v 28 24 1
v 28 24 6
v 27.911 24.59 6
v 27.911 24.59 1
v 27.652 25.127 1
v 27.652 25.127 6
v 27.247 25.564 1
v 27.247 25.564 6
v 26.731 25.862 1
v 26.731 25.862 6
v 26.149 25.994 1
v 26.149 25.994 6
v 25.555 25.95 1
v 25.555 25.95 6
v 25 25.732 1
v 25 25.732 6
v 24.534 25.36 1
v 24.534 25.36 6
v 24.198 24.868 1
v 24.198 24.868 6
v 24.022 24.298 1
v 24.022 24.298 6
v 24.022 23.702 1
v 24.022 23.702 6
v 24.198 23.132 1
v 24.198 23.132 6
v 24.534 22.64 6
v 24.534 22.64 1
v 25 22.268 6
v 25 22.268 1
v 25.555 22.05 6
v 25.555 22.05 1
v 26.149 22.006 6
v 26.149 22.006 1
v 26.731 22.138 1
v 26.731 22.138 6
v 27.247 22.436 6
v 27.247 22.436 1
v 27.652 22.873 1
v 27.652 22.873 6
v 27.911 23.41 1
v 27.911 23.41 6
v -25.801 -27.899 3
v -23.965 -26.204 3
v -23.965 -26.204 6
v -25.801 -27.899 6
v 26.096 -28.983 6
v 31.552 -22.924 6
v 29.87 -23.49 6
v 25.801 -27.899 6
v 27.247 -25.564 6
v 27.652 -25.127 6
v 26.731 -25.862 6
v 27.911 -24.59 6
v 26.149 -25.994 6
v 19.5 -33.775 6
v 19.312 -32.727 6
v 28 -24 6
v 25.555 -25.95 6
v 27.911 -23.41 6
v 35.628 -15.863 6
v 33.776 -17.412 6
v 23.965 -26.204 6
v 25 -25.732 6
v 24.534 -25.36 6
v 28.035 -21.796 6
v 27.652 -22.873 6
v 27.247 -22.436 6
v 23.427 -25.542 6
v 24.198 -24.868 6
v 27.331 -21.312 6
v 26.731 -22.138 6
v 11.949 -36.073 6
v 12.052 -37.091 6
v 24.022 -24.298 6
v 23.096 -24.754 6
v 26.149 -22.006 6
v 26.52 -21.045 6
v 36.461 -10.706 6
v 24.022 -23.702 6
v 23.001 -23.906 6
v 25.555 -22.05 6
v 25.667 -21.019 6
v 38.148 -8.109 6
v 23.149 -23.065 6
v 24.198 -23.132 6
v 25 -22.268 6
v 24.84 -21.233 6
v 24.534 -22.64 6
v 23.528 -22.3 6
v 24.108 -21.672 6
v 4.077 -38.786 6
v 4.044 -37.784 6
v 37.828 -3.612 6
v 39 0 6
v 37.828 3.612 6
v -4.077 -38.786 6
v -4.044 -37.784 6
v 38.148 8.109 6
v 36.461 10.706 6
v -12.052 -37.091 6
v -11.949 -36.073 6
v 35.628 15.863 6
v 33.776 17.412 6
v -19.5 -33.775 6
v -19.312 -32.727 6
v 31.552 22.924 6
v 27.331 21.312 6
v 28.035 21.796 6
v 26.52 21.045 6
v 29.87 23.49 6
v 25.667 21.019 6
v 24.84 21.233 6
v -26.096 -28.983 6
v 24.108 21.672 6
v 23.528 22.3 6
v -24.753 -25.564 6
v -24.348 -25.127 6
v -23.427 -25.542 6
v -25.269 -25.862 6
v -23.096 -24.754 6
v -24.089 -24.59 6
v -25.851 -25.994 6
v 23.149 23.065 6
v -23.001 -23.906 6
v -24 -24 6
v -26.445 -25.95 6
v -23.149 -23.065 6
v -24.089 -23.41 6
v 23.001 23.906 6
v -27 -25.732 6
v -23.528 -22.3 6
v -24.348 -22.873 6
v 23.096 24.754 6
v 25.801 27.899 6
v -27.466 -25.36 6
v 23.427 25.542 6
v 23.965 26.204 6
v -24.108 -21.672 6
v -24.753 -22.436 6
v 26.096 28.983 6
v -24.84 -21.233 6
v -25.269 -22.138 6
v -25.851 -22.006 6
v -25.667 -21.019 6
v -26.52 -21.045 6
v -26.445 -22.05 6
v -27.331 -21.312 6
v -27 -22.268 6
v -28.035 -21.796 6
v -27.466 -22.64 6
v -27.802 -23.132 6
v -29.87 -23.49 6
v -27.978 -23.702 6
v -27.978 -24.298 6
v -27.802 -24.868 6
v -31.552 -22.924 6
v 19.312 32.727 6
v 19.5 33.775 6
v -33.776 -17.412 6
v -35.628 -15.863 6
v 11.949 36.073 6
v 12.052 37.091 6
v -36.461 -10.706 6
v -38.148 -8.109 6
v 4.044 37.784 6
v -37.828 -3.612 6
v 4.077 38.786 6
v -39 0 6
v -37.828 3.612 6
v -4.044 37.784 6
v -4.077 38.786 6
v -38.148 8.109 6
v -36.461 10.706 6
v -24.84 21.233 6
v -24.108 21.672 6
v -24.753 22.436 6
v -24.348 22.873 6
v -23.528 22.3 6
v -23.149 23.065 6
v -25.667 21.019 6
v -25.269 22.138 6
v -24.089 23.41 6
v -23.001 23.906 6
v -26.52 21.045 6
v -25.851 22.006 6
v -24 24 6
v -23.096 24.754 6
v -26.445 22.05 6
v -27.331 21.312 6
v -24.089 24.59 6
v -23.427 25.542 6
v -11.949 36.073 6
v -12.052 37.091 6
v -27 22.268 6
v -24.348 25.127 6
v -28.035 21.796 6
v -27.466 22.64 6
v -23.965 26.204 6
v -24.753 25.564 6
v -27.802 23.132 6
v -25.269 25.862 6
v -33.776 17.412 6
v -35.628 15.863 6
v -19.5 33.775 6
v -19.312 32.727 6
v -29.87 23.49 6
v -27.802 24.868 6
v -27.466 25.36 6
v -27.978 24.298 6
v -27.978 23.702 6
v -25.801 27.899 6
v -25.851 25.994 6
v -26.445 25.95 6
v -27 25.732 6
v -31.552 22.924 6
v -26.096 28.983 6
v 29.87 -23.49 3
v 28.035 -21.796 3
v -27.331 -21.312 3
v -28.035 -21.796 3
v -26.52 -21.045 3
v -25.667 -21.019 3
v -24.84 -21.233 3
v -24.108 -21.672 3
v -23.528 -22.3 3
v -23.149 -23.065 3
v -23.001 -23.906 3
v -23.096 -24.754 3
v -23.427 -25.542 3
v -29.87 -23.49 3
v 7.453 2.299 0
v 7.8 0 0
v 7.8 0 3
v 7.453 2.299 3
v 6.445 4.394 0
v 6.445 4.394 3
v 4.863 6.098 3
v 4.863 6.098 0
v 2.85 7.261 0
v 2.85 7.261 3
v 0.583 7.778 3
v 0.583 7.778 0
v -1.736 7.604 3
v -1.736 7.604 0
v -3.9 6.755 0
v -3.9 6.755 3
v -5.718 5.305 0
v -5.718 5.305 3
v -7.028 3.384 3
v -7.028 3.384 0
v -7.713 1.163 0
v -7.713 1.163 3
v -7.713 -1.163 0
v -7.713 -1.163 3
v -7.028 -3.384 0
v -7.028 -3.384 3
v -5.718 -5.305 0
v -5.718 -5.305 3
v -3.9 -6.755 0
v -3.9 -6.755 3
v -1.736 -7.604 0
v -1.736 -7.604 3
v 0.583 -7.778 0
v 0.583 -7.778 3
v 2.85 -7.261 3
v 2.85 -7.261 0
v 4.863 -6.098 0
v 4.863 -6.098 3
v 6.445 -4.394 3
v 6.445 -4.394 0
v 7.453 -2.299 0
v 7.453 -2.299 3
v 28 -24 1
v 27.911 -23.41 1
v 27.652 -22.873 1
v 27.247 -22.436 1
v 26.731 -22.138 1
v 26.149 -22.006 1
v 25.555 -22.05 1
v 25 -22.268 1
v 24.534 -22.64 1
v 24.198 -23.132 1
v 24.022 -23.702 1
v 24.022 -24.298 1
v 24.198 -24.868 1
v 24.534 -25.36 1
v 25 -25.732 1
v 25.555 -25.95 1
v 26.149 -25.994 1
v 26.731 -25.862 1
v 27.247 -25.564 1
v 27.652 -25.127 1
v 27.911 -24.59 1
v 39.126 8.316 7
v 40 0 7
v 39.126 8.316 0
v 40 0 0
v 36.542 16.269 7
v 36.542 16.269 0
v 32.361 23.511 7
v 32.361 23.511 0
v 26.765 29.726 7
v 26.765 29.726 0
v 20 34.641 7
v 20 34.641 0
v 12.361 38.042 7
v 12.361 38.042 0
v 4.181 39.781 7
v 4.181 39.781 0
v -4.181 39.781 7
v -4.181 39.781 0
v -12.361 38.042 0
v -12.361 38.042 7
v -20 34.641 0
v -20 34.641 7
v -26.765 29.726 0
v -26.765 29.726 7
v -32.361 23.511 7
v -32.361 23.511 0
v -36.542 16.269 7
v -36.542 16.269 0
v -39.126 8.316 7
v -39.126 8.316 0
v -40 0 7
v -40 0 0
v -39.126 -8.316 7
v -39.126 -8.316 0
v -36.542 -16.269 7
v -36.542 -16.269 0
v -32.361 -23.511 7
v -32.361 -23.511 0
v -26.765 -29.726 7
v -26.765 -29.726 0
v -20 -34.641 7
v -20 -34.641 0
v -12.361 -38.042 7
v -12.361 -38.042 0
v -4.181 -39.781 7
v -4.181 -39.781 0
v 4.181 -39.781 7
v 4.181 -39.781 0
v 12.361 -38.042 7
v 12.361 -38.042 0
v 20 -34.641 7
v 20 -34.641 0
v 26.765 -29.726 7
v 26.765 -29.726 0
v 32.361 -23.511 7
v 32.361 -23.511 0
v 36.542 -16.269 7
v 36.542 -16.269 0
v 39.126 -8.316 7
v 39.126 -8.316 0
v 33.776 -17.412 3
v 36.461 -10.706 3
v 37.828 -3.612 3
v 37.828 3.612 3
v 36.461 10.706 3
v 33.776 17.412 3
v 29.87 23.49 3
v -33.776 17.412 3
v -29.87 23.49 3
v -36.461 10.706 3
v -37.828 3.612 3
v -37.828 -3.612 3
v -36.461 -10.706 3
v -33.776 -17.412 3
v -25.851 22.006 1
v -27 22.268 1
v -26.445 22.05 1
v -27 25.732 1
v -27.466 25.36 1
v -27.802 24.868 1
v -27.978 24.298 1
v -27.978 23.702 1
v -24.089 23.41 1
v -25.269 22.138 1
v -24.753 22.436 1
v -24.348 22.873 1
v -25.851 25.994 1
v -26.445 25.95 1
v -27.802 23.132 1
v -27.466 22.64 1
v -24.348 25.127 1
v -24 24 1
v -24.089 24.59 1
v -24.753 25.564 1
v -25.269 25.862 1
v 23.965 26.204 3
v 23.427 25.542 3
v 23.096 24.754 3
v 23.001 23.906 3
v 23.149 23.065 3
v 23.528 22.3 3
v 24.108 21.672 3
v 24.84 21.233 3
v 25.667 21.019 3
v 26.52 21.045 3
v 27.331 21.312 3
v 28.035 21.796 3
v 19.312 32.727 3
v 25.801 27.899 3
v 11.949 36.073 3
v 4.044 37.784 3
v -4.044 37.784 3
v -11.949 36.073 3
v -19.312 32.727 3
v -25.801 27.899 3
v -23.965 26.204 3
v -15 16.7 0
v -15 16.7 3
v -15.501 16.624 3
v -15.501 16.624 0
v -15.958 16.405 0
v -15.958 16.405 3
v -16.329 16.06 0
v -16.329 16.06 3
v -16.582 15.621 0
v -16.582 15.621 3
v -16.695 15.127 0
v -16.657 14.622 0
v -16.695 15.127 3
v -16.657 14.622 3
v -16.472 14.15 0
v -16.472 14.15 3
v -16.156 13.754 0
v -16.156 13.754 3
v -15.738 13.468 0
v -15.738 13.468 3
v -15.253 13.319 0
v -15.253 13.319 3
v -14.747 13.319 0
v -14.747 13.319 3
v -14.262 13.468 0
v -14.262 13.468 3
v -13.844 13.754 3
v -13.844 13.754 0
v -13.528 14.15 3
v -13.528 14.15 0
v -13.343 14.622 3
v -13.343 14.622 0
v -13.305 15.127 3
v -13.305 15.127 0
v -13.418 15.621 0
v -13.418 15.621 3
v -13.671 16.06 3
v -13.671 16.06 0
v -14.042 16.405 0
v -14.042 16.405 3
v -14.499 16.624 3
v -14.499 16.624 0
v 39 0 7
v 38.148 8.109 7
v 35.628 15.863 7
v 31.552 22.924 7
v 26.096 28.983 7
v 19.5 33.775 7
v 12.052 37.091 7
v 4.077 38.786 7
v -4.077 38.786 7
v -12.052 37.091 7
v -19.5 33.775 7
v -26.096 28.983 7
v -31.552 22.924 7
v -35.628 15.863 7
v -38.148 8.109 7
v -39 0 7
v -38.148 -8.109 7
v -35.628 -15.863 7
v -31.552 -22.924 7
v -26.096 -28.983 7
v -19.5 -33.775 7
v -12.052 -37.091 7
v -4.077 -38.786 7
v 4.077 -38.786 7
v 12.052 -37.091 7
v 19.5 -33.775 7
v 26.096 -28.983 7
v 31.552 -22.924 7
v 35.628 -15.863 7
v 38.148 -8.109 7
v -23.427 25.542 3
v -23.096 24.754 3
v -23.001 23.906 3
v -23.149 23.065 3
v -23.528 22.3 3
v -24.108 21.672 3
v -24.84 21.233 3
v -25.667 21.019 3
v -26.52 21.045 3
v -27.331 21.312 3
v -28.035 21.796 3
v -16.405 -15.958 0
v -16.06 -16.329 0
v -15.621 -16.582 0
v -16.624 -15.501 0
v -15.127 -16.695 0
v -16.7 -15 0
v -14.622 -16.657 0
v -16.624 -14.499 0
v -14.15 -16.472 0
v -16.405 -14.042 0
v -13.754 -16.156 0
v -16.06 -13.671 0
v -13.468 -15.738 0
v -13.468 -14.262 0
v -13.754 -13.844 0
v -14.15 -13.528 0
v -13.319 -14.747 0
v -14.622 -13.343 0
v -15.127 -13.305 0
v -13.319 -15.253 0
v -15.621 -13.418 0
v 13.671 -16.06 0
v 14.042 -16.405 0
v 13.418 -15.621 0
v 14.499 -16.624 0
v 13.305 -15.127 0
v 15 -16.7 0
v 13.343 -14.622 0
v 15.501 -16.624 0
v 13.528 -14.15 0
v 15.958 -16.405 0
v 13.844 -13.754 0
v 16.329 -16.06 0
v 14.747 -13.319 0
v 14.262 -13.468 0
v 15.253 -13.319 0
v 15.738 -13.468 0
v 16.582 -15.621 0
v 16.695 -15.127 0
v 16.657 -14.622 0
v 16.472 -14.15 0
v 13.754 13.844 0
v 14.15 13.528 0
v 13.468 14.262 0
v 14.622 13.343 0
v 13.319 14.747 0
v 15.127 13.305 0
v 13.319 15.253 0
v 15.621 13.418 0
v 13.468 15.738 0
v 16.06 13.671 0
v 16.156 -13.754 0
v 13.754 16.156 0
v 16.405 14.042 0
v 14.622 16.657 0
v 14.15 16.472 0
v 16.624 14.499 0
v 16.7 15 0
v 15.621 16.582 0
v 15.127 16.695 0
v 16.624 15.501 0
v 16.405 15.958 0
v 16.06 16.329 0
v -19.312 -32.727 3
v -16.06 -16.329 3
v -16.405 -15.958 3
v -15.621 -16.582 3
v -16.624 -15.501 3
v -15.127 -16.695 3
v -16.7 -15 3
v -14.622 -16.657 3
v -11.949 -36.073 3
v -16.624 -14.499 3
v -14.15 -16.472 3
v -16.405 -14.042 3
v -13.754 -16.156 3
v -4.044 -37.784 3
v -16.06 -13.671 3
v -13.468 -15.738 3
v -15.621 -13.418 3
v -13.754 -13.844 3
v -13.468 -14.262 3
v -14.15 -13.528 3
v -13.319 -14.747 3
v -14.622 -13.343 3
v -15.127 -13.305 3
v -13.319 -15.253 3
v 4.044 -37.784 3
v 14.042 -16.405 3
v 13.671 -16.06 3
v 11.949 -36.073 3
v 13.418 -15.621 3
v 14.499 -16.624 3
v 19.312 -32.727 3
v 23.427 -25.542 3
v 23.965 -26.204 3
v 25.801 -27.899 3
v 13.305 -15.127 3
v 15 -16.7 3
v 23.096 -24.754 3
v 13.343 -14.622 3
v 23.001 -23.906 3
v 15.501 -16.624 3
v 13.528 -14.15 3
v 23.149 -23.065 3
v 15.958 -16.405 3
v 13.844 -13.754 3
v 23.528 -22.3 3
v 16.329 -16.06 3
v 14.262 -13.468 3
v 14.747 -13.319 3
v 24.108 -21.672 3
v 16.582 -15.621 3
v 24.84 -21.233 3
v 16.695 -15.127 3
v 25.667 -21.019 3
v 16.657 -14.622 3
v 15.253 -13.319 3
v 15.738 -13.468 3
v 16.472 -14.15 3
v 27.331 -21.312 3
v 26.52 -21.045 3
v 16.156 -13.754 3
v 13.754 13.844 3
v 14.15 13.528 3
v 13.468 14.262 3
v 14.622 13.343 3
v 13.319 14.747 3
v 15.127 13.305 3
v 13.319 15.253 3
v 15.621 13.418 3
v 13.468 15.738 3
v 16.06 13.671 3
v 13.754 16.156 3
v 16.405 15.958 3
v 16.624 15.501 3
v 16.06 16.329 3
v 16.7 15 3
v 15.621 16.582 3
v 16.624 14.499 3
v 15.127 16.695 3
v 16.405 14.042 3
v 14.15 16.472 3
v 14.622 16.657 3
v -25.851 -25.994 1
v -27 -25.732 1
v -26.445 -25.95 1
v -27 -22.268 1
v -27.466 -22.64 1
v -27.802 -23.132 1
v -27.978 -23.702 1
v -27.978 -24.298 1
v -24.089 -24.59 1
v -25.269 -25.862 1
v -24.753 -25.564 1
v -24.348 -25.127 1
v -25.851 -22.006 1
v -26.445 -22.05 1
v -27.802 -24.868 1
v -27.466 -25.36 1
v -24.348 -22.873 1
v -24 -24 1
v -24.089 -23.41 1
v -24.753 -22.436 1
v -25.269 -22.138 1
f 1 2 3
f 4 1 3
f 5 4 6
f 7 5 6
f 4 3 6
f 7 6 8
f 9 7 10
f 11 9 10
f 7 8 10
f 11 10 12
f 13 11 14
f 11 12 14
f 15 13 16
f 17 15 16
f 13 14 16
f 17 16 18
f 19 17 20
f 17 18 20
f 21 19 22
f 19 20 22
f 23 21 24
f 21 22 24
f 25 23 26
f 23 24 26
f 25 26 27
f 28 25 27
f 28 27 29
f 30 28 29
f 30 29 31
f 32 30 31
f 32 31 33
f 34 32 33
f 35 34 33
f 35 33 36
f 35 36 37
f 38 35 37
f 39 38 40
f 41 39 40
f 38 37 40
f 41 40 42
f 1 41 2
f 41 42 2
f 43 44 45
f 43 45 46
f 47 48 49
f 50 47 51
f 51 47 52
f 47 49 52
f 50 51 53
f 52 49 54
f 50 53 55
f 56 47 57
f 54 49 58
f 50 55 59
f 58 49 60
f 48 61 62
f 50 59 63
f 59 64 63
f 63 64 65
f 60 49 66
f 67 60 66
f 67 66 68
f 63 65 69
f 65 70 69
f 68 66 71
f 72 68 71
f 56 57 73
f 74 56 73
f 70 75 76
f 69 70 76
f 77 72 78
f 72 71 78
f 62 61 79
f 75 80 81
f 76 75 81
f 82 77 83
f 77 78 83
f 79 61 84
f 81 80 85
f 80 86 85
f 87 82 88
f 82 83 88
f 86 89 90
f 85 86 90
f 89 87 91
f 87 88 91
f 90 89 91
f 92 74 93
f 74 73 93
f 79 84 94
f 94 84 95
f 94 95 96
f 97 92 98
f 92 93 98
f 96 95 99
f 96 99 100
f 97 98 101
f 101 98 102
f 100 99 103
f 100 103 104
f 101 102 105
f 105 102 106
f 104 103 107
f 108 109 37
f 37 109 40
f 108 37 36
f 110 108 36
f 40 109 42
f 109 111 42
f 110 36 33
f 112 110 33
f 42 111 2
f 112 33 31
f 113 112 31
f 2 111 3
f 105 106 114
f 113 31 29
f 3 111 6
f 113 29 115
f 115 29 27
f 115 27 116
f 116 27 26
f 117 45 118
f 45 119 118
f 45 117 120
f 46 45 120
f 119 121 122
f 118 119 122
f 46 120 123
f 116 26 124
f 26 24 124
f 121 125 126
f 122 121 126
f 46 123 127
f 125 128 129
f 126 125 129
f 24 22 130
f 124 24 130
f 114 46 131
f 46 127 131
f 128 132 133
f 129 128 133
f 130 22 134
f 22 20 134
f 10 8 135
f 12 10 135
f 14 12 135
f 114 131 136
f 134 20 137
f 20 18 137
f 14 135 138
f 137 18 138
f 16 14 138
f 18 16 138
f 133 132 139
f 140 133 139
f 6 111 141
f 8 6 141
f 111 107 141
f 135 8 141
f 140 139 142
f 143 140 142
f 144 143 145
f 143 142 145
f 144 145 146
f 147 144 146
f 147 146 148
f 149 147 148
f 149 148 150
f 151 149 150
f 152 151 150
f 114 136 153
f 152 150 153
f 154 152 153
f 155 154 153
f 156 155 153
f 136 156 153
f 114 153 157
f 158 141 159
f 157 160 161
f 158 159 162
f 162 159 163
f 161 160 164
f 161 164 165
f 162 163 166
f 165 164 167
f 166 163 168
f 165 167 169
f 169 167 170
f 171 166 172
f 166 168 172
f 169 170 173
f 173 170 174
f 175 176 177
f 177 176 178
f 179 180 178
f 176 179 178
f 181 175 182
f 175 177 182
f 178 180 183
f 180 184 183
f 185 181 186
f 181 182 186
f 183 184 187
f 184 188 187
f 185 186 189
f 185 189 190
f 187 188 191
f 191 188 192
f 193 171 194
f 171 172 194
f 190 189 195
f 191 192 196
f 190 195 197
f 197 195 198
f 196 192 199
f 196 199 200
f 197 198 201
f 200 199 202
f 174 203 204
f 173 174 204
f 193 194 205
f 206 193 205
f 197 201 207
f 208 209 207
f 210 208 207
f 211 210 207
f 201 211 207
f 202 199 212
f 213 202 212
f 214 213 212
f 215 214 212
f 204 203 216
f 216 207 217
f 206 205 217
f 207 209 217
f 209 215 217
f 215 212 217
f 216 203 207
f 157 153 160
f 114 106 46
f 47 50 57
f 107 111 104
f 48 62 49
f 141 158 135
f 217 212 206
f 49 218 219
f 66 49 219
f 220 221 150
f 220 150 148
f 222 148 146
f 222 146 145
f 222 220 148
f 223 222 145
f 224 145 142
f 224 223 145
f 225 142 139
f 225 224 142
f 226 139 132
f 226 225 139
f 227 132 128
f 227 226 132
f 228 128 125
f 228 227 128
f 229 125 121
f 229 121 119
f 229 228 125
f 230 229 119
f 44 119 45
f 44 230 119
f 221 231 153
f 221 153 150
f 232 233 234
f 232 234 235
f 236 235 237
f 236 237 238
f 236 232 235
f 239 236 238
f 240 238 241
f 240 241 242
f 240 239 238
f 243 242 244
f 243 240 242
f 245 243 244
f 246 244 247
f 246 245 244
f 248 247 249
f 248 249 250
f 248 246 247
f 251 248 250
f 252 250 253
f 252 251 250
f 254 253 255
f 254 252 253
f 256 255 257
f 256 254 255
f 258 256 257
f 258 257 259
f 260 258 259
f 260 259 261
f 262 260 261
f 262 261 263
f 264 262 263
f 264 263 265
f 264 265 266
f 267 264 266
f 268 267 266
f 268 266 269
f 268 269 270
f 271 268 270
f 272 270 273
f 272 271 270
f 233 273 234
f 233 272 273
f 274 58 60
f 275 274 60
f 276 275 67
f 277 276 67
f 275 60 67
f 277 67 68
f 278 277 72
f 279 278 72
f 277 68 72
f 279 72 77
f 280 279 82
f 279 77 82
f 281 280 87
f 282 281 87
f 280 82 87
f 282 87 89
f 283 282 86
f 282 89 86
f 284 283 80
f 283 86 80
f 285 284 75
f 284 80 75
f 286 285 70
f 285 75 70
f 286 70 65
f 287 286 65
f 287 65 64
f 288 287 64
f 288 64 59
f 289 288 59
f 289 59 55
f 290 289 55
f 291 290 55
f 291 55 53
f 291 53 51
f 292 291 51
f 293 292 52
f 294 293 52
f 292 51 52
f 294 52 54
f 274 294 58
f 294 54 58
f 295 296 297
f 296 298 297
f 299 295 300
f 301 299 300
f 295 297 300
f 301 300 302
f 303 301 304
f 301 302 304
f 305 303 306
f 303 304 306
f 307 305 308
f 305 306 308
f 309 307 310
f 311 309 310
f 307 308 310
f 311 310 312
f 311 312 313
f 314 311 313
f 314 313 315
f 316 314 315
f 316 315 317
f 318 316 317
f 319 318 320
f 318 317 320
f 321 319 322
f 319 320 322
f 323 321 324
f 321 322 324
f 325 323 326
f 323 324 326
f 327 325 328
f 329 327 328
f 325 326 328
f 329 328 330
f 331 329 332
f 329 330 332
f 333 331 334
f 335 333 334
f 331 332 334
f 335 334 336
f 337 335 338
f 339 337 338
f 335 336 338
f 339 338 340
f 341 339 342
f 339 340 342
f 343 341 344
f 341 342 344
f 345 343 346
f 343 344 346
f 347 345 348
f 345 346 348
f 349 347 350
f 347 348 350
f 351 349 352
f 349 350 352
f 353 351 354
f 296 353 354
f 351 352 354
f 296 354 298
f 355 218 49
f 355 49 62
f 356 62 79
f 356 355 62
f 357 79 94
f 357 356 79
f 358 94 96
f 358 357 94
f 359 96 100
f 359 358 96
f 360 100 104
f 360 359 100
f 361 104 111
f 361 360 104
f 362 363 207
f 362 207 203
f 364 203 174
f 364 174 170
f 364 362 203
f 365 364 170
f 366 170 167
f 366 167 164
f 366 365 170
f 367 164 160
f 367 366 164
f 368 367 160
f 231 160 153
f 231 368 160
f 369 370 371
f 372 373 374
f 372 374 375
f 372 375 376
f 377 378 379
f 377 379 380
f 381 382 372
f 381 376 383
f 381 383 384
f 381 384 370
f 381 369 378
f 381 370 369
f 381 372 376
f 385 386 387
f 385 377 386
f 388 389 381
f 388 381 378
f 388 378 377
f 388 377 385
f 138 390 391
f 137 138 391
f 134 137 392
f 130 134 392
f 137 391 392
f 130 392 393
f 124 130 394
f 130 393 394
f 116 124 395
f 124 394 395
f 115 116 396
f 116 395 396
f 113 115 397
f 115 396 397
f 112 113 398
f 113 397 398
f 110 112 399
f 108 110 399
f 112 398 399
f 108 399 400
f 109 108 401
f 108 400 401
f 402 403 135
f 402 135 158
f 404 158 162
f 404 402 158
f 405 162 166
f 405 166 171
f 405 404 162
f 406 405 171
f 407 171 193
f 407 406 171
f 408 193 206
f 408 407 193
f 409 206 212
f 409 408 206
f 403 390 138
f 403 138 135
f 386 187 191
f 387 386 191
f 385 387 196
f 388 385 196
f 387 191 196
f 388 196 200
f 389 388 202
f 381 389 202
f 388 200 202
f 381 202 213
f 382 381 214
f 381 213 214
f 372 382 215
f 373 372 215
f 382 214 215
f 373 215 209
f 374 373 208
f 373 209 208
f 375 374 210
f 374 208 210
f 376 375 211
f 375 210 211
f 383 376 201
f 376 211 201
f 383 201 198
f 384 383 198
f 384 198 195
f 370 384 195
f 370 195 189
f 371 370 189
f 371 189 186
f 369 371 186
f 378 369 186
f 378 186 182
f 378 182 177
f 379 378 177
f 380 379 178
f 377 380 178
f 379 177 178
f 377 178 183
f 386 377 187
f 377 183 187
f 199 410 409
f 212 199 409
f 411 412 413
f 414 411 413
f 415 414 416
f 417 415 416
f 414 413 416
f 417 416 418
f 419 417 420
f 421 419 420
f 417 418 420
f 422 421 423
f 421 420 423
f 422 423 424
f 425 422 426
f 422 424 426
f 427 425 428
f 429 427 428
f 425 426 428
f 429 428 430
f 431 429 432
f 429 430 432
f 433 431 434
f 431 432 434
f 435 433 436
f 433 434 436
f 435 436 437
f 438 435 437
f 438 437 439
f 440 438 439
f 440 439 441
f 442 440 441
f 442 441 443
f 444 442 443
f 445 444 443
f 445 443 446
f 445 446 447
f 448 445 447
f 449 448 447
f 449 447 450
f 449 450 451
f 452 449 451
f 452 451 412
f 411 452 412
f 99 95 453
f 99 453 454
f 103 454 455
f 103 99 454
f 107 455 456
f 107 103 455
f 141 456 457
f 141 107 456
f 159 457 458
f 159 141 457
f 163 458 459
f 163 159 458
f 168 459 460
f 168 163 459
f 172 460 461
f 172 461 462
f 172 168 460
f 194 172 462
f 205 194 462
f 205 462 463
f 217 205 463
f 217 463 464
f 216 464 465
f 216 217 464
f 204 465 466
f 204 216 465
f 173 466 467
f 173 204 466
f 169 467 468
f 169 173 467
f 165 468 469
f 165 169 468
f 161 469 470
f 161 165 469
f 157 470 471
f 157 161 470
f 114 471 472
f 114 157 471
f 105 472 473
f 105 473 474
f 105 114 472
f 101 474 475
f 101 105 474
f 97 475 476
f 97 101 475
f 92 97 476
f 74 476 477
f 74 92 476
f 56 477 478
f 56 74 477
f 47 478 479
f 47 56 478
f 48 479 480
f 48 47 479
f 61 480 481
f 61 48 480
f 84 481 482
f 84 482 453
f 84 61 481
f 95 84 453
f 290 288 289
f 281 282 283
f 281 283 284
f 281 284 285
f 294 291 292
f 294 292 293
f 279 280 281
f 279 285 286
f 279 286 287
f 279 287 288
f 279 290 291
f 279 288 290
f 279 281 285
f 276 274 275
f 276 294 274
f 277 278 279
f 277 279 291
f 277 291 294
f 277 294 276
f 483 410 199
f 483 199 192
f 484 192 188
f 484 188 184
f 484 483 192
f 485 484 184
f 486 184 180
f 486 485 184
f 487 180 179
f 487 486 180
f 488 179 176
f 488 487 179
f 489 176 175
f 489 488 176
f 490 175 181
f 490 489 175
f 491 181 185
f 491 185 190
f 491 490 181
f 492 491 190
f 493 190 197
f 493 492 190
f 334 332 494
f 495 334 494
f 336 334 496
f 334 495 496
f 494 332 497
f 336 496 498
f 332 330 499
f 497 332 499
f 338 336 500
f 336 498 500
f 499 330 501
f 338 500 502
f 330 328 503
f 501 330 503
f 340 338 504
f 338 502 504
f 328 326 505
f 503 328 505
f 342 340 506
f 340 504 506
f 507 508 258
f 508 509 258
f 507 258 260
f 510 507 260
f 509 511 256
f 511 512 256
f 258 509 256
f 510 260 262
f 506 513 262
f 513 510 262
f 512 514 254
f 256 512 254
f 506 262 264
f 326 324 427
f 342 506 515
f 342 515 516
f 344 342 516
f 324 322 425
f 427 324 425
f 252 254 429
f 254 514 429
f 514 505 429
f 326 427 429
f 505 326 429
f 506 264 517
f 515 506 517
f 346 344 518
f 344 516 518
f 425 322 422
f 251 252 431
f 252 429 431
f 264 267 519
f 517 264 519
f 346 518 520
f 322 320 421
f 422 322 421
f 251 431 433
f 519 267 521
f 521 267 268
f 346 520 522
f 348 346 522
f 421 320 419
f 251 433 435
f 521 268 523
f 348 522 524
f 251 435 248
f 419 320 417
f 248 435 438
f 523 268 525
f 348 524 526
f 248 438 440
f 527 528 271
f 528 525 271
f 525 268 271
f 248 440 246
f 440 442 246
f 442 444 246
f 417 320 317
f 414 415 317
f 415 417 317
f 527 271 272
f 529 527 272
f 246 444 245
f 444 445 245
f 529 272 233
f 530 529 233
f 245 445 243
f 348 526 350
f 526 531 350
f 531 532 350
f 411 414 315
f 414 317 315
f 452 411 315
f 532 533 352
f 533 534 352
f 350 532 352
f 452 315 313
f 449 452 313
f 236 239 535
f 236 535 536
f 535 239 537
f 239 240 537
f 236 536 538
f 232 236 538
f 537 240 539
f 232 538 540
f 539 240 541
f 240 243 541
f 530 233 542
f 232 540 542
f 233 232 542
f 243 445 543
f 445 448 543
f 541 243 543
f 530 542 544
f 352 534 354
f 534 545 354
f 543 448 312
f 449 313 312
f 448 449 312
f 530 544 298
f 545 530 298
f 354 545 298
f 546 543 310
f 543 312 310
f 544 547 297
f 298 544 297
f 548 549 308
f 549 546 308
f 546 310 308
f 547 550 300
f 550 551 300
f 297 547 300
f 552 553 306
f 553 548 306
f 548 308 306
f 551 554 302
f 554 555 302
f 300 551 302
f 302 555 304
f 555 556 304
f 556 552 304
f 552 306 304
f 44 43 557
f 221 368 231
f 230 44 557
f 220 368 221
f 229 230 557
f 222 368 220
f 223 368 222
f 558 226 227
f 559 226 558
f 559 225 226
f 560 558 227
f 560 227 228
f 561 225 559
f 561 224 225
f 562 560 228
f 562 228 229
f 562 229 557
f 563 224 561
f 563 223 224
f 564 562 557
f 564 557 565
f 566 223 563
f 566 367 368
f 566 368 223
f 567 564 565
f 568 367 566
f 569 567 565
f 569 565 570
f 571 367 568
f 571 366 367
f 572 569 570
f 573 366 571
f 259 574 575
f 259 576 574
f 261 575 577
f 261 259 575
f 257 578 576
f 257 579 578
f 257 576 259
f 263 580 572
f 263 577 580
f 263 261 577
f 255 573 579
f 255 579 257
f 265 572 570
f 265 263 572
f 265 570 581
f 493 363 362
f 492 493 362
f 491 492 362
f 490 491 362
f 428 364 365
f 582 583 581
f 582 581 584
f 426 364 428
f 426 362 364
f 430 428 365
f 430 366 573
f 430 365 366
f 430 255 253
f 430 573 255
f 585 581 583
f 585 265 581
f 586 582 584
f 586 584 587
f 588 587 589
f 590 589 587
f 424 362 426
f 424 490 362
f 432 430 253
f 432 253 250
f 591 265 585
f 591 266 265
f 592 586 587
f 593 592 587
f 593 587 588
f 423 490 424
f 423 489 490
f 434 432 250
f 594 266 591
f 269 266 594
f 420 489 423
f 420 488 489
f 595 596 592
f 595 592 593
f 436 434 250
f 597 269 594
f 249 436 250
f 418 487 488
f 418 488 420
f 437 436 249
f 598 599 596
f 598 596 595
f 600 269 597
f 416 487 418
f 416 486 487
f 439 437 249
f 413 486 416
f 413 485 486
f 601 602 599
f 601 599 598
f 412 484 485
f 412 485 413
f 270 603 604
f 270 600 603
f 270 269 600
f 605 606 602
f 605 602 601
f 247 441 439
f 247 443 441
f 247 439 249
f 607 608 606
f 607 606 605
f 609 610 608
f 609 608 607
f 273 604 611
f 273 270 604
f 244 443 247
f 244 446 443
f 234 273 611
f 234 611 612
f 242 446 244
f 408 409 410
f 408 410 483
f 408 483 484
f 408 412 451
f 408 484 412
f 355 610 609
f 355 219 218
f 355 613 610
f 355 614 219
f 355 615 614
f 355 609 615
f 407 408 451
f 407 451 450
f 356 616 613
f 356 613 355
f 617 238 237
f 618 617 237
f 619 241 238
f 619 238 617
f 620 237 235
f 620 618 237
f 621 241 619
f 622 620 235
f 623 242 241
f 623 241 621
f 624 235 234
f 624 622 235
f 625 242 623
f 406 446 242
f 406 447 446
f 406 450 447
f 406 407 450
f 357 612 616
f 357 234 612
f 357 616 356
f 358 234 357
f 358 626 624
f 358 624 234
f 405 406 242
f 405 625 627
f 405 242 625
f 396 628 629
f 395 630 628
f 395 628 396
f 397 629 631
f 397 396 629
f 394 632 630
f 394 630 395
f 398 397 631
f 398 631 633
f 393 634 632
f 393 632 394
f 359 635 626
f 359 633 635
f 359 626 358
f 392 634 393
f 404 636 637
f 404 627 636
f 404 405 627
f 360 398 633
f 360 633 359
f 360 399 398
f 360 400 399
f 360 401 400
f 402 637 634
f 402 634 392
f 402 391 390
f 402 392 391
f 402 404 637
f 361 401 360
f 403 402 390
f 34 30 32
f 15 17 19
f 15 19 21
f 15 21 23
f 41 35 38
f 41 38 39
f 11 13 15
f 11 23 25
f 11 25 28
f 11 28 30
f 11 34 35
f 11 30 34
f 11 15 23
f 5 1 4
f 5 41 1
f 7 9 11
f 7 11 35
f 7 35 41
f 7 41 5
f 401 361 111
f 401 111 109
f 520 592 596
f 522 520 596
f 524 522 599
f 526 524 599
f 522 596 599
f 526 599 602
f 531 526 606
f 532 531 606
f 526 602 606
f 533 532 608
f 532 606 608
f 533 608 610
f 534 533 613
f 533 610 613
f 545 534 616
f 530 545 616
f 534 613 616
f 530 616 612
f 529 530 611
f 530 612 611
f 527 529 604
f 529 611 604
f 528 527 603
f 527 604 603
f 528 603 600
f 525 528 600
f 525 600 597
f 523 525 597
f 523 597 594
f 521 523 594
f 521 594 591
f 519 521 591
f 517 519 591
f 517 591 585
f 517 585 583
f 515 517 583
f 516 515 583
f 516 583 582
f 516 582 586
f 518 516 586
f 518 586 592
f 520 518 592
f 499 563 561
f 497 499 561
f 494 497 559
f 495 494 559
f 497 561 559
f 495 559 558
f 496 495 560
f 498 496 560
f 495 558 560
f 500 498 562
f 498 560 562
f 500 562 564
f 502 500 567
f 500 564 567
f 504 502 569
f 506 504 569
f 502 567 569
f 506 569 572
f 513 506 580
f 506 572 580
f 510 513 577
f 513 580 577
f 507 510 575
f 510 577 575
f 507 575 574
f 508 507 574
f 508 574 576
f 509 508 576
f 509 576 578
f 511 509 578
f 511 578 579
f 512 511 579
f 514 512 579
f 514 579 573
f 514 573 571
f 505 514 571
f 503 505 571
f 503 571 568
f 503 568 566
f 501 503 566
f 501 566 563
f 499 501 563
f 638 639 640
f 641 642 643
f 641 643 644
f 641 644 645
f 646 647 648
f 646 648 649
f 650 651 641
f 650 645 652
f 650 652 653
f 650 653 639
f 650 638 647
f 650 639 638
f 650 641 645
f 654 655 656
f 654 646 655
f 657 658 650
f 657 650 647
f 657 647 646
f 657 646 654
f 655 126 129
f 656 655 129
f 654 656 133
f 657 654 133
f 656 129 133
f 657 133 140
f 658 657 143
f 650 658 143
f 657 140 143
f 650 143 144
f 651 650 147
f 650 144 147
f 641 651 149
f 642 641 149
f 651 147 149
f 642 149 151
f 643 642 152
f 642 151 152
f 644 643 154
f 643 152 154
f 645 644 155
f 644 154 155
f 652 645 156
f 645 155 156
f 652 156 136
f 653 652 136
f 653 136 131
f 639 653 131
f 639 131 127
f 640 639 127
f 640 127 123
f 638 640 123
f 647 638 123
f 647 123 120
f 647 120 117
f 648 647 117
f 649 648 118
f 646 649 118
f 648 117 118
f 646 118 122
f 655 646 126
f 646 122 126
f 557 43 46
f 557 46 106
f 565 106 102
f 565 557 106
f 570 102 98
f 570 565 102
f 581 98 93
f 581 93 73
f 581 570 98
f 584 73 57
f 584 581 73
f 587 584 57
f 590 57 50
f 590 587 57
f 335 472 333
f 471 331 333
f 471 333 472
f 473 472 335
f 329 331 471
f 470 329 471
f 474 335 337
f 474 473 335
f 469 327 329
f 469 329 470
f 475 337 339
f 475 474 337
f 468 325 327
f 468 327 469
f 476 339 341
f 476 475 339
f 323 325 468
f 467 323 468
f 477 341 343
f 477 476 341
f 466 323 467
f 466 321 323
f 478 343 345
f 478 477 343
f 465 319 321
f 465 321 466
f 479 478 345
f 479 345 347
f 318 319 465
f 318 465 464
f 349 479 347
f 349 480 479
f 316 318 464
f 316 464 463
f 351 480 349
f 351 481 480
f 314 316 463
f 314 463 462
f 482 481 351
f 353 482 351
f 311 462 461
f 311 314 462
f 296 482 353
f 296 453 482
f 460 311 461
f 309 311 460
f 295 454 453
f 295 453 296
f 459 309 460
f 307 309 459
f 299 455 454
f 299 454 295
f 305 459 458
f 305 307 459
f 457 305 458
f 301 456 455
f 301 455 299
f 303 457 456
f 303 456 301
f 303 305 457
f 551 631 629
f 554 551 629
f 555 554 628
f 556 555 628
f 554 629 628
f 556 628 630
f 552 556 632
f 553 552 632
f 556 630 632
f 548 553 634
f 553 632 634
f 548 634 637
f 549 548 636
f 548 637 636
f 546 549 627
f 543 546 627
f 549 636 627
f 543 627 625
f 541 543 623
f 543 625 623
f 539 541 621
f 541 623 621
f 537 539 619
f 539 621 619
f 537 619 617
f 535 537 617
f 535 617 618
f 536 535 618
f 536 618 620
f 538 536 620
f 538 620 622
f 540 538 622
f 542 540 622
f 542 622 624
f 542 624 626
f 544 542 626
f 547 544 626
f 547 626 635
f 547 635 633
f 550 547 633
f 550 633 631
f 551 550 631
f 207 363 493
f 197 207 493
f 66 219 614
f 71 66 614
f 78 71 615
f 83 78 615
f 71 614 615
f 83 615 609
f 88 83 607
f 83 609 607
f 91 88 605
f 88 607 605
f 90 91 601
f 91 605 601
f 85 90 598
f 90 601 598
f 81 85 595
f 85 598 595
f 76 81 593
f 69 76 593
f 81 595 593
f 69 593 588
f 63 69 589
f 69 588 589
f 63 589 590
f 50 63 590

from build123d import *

# Parameters (mm, degrees)
SKETCH_R           = 40
SKETCH_R_2         = 7.8
PAD_DEPTH          = 3
SKETCH001_R        = 1.7
POCKET_DEPTH       = 229.354706
POLARPATTERN_COUNT = 4
SKETCH002_R        = 40
SKETCH002_R_2      = 38
PAD001_DEPTH       = 3
SKETCH003_R        = 40
SKETCH003_R_2      = 39
PAD002_DEPTH       = 1
PAD003_DEPTH       = 3
SKETCH005_R        = 2
POCKET001_DEPTH    = 5


with BuildPart() as part:
    # Sketch → Pad (new body)
    with BuildSketch(Plane.XY):
        Circle(SKETCH_R)
        Circle(SKETCH_R_2, mode=Mode.SUBTRACT)
    extrude(amount=PAD_DEPTH)

    # Sketch001 → Pocket (cut, through all)
    with BuildSketch(Plane.XY.offset(3)):
        with Locations((15, 15)):
            Circle(SKETCH001_R)
    pocket = extrude(amount=-POCKET_DEPTH, mode=Mode.SUBTRACT)

    # PolarPattern: Pocket ×4 about axis
    polarpattern_axis = Axis((0, 0, 3), (0, 0, 1))
    for i in range(1, POLARPATTERN_COUNT):
        add(pocket.rotate(polarpattern_axis, i * 360 / POLARPATTERN_COUNT), mode=Mode.SUBTRACT)

    # Sketch002 → Pad001 (new body)
    with BuildSketch(Plane.XY.offset(3)):
        Circle(SKETCH002_R)
        Circle(SKETCH002_R_2, mode=Mode.SUBTRACT)
    extrude(amount=PAD001_DEPTH)

    # Sketch003 → Pad002 (new body)
    with BuildSketch(Plane.XY.offset(6)):
        Circle(SKETCH003_R)
        Circle(SKETCH003_R_2, mode=Mode.SUBTRACT)
    extrude(amount=PAD002_DEPTH)

    # Sketch004 → Pad003 (new body)
    with BuildSketch(Plane.XY.offset(3)):
        with BuildLine():
            ThreePointArc((23.96516, 26.20441), (23.79559, 21.96516), (28.03484, 21.79559))
            Line((29.957371, 23.570234), (28.03484, 21.79559))
            Line((25.887691, 27.979054), (29.957371, 23.570234))
            Line((23.96516, 26.20441), (25.887691, 27.979054))
        make_face()
        with BuildLine():
            ThreePointArc((28.03484, -21.79559), (23.79559, -21.96516), (23.96516, -26.20441))
            Line((23.96516, -26.20441), (25.887691, -27.979054))
            Line((25.887691, -27.979054), (29.957371, -23.570234))
            Line((29.957371, -23.570234), (28.03484, -21.79559))
        make_face()
    pad003 = extrude(amount=PAD003_DEPTH)

    # Mirrored: Pad003 across Sketch004 V_Axis
    add(pad003.mirror(Plane(origin=(0, 0, 3), x_dir=(0, 0, 1), z_dir=(1, 0, 0))))

    # Sketch005 → Pocket001 (cut)
    with BuildSketch(Plane.XY.offset(6)):
        with Locations((-26, 24)):
            Circle(SKETCH005_R)
        with Locations((-26, -24)):
            Circle(SKETCH005_R)
        with Locations((26, -24)):
            Circle(SKETCH005_R)
        with Locations((26, 24)):
            Circle(SKETCH005_R)
    extrude(amount=-POCKET001_DEPTH, mode=Mode.SUBTRACT)


solid = part.part
